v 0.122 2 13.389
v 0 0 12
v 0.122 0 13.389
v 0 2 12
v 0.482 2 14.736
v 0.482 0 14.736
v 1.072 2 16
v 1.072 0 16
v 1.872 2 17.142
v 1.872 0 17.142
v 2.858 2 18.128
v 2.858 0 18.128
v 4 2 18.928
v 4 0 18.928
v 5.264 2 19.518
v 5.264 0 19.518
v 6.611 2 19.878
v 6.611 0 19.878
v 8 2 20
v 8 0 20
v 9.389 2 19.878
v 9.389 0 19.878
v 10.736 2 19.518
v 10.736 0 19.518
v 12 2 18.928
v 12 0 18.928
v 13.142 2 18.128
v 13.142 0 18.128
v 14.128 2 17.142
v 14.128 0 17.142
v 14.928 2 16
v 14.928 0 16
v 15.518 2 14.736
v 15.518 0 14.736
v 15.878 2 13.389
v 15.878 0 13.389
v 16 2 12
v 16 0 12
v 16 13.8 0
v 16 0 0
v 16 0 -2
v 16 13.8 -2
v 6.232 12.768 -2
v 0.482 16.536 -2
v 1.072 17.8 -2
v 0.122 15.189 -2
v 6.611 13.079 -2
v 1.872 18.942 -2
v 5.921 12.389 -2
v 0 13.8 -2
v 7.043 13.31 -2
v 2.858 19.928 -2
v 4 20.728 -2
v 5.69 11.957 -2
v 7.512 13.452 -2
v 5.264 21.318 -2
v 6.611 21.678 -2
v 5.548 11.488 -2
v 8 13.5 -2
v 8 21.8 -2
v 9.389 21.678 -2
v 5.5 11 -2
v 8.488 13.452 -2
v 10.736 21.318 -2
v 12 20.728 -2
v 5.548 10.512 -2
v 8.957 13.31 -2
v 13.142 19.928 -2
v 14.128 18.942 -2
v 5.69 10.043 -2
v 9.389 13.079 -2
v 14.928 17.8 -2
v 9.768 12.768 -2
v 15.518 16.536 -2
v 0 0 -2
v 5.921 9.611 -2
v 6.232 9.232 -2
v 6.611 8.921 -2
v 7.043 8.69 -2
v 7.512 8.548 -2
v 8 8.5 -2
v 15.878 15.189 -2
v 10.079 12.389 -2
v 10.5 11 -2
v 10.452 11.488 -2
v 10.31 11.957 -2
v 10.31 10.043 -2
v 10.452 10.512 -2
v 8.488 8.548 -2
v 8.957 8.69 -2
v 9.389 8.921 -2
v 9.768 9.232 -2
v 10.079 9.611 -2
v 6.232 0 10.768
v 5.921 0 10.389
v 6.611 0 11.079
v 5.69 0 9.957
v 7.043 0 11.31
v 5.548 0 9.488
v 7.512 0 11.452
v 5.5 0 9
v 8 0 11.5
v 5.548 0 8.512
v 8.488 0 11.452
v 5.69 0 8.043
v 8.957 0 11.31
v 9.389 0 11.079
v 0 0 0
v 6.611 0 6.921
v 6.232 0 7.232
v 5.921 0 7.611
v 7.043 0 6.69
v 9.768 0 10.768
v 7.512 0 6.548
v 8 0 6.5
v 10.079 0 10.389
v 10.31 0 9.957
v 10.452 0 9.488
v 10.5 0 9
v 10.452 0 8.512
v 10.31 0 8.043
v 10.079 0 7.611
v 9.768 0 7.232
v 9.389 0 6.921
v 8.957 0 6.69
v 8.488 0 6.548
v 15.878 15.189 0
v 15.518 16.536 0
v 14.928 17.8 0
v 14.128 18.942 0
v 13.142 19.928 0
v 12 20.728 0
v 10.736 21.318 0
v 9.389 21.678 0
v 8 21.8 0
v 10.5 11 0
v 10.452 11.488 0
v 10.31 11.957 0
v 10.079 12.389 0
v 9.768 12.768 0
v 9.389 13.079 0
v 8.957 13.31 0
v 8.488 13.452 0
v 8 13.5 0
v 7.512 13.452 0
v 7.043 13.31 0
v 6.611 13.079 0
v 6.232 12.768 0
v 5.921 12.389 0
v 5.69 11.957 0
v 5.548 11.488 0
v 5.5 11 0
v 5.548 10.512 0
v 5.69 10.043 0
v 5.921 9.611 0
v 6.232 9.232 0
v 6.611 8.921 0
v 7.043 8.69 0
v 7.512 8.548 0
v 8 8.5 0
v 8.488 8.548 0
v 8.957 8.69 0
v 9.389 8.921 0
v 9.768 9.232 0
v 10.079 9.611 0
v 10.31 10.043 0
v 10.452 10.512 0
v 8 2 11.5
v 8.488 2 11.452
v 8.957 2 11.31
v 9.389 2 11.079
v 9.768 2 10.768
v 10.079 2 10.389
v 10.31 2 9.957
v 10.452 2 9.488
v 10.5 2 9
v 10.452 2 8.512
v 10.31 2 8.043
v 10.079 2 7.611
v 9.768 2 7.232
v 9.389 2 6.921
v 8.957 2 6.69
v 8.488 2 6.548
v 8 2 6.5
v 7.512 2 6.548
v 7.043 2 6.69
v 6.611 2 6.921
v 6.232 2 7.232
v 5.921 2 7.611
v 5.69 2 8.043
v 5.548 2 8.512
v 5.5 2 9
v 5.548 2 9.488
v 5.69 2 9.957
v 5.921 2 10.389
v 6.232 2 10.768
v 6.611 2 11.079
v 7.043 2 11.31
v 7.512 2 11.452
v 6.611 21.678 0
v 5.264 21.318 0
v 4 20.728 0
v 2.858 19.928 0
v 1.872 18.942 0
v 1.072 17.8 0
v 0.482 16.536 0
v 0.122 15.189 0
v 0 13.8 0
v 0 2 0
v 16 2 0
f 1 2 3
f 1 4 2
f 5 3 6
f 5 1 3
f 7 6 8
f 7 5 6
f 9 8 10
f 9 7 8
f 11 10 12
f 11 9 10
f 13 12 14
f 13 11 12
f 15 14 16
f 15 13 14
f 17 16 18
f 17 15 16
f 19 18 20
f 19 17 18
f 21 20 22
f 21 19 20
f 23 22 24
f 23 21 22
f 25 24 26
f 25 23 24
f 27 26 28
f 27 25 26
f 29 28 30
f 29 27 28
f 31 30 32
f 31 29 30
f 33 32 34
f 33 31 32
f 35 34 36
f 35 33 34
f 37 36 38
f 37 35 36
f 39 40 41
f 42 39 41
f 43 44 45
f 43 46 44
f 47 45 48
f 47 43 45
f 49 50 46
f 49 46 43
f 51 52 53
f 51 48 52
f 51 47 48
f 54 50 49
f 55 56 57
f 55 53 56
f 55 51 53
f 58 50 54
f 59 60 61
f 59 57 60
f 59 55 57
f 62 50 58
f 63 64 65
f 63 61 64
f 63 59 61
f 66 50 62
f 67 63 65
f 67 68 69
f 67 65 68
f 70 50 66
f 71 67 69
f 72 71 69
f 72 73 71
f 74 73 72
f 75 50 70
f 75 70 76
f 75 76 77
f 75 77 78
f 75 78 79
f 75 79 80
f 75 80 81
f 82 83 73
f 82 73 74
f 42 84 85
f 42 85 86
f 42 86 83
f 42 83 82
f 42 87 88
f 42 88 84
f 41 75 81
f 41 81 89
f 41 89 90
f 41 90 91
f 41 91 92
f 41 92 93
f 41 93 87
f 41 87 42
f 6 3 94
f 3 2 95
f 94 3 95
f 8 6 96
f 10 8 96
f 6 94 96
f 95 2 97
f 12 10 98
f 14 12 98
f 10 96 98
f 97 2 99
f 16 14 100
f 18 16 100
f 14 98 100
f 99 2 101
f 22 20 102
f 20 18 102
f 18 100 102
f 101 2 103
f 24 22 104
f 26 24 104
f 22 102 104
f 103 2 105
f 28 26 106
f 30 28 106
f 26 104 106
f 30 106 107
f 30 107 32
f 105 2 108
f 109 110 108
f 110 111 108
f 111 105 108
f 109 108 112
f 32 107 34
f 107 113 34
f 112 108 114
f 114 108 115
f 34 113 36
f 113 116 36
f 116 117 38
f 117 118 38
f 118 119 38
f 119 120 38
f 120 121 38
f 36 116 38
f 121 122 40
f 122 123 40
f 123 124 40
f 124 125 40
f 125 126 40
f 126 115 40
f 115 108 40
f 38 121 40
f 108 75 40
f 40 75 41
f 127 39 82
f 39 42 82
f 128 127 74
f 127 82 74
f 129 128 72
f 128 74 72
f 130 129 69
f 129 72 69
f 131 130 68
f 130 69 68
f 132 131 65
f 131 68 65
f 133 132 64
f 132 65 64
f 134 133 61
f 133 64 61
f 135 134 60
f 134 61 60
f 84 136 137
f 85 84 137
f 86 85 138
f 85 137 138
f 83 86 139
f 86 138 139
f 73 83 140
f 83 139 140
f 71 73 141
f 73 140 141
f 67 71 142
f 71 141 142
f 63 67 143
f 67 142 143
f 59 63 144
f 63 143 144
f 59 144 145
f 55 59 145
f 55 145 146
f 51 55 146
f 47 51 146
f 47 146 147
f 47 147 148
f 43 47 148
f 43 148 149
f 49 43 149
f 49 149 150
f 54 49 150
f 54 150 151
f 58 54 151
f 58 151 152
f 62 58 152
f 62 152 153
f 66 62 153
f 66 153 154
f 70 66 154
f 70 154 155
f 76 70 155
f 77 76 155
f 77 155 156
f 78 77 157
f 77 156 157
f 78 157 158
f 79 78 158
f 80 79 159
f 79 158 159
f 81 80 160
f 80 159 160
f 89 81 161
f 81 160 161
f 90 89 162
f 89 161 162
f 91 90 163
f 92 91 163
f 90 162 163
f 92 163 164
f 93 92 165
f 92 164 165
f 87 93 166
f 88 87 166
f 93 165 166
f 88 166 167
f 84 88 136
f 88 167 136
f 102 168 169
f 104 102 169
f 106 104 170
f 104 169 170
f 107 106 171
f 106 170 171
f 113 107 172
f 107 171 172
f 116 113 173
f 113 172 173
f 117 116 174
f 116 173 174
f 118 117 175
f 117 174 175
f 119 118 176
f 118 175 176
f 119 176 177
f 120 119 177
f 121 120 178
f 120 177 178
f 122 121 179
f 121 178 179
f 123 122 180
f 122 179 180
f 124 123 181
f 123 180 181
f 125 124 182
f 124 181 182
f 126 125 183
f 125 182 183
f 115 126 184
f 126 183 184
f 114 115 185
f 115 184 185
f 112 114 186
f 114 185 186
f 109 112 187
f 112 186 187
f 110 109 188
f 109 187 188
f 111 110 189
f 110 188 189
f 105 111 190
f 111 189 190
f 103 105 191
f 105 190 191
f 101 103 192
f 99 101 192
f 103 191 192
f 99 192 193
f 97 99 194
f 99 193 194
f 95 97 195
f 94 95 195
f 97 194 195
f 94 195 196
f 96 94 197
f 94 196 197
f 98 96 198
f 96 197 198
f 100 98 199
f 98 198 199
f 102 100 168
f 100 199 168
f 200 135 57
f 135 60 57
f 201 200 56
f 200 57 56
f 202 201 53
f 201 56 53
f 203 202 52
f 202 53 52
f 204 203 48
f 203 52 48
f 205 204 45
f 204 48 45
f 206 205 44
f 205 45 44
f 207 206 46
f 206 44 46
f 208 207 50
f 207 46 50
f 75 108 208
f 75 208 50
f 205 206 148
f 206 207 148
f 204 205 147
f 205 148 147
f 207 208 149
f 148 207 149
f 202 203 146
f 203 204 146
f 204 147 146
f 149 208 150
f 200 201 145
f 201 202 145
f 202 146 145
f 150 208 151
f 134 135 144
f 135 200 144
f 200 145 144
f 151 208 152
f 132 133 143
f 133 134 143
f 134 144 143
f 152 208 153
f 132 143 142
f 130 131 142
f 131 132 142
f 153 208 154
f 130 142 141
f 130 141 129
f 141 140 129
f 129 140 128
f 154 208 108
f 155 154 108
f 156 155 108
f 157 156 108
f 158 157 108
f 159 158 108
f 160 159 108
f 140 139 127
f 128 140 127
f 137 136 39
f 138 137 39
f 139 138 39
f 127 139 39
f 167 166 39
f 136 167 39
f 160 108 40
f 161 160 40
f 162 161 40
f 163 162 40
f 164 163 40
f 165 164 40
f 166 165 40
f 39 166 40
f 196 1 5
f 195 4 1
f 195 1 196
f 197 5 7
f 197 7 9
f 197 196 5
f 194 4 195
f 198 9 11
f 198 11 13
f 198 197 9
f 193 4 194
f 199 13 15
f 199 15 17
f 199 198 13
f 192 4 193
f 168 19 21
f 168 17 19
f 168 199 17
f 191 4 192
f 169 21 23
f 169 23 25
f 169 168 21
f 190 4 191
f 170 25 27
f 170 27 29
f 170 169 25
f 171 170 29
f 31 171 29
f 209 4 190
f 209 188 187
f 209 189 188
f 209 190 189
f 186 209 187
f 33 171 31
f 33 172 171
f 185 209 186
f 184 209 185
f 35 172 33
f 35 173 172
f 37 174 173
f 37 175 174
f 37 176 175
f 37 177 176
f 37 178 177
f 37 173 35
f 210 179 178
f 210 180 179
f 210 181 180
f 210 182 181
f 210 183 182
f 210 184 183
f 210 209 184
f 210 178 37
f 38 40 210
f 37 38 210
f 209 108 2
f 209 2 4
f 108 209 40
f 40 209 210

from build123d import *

# Parameters (mm, degrees)
SKETCH_1_W          = 16
SKETCH_1_H          = 2
EXTRUDE_1_DEPTH     = 20
FILLET_1_R          = 8
FILLET_2_R          = 8
SKETCH_2_W          = 16
SKETCH_2_H          = 2
EXTRUDE_2_DEPTH     = 21.8
FILLET_3_R          = 8
FILLET_4_R          = 8
SKETCH_4_R          = 2.5
CUT_EXTRUDE_2_DEPTH = 2
SKETCH_6_R          = 2.5
CUT_EXTRUDE_3_DEPTH = 3


with BuildPart() as part:
    # 草图1 → 凸台-拉伸1 (new body)
    with BuildSketch(Plane.XY):
        with Locations((8, 1)):
            Rectangle(SKETCH_1_W, SKETCH_1_H)
    extrude(amount=EXTRUDE_1_DEPTH)

    # 圆角1
    fillet_1_edges = [part.edges().sort_by_distance(p)[0] for p in [
        (0, 1, 20),
    ]]
    fillet(fillet_1_edges, radius=FILLET_1_R)

    # 圆角2
    fillet_2_edges = [part.edges().sort_by_distance(p)[0] for p in [
        (16, 1, 20),
    ]]
    fillet(fillet_2_edges, radius=FILLET_2_R - 0.0001)  # a hair under: the kernel refuses the full size

    # 草图4 → 切除-拉伸2 (cut)
    with BuildSketch(Plane(origin=(0, 2, 0), x_dir=(1, 0, 0), z_dir=(0, 1, 0))):
        with Locations(Location((8, -9, 0), (0, 0, 270))):
            Circle(SKETCH_4_R)
    extrude(amount=-CUT_EXTRUDE_2_DEPTH, mode=Mode.SUBTRACT)


with BuildPart() as body_2:
    # 草图2 → 凸台-拉伸2 (new body)
    with BuildSketch(Plane(origin=(0, 0, 0), x_dir=(1, 0, 0), z_dir=(0, 1, 0))):
        with Locations((8, 1)):
            Rectangle(SKETCH_2_W, SKETCH_2_H)
    extrude(amount=EXTRUDE_2_DEPTH)

    # 圆角3
    fillet_3_edges = [body_2.edges().sort_by_distance(p)[0] for p in [
        (16, 21.8, -1),
    ]]
    fillet(fillet_3_edges, radius=FILLET_3_R)

    # 圆角4
    fillet_4_edges = [body_2.edges().sort_by_distance(p)[0] for p in [
        (0, 21.8, -1),
    ]]
    fillet(fillet_4_edges, radius=FILLET_4_R - 0.0001)  # a hair under: the kernel refuses the full size

    # 草图6 → 切除-拉伸3 (cut)
    with BuildSketch(Plane.XY):
        with Locations((8, 11)):
            Circle(SKETCH_6_R)
    extrude(amount=-CUT_EXTRUDE_3_DEPTH, mode=Mode.SUBTRACT)


solid = Compound([part.part, body_2.part])
